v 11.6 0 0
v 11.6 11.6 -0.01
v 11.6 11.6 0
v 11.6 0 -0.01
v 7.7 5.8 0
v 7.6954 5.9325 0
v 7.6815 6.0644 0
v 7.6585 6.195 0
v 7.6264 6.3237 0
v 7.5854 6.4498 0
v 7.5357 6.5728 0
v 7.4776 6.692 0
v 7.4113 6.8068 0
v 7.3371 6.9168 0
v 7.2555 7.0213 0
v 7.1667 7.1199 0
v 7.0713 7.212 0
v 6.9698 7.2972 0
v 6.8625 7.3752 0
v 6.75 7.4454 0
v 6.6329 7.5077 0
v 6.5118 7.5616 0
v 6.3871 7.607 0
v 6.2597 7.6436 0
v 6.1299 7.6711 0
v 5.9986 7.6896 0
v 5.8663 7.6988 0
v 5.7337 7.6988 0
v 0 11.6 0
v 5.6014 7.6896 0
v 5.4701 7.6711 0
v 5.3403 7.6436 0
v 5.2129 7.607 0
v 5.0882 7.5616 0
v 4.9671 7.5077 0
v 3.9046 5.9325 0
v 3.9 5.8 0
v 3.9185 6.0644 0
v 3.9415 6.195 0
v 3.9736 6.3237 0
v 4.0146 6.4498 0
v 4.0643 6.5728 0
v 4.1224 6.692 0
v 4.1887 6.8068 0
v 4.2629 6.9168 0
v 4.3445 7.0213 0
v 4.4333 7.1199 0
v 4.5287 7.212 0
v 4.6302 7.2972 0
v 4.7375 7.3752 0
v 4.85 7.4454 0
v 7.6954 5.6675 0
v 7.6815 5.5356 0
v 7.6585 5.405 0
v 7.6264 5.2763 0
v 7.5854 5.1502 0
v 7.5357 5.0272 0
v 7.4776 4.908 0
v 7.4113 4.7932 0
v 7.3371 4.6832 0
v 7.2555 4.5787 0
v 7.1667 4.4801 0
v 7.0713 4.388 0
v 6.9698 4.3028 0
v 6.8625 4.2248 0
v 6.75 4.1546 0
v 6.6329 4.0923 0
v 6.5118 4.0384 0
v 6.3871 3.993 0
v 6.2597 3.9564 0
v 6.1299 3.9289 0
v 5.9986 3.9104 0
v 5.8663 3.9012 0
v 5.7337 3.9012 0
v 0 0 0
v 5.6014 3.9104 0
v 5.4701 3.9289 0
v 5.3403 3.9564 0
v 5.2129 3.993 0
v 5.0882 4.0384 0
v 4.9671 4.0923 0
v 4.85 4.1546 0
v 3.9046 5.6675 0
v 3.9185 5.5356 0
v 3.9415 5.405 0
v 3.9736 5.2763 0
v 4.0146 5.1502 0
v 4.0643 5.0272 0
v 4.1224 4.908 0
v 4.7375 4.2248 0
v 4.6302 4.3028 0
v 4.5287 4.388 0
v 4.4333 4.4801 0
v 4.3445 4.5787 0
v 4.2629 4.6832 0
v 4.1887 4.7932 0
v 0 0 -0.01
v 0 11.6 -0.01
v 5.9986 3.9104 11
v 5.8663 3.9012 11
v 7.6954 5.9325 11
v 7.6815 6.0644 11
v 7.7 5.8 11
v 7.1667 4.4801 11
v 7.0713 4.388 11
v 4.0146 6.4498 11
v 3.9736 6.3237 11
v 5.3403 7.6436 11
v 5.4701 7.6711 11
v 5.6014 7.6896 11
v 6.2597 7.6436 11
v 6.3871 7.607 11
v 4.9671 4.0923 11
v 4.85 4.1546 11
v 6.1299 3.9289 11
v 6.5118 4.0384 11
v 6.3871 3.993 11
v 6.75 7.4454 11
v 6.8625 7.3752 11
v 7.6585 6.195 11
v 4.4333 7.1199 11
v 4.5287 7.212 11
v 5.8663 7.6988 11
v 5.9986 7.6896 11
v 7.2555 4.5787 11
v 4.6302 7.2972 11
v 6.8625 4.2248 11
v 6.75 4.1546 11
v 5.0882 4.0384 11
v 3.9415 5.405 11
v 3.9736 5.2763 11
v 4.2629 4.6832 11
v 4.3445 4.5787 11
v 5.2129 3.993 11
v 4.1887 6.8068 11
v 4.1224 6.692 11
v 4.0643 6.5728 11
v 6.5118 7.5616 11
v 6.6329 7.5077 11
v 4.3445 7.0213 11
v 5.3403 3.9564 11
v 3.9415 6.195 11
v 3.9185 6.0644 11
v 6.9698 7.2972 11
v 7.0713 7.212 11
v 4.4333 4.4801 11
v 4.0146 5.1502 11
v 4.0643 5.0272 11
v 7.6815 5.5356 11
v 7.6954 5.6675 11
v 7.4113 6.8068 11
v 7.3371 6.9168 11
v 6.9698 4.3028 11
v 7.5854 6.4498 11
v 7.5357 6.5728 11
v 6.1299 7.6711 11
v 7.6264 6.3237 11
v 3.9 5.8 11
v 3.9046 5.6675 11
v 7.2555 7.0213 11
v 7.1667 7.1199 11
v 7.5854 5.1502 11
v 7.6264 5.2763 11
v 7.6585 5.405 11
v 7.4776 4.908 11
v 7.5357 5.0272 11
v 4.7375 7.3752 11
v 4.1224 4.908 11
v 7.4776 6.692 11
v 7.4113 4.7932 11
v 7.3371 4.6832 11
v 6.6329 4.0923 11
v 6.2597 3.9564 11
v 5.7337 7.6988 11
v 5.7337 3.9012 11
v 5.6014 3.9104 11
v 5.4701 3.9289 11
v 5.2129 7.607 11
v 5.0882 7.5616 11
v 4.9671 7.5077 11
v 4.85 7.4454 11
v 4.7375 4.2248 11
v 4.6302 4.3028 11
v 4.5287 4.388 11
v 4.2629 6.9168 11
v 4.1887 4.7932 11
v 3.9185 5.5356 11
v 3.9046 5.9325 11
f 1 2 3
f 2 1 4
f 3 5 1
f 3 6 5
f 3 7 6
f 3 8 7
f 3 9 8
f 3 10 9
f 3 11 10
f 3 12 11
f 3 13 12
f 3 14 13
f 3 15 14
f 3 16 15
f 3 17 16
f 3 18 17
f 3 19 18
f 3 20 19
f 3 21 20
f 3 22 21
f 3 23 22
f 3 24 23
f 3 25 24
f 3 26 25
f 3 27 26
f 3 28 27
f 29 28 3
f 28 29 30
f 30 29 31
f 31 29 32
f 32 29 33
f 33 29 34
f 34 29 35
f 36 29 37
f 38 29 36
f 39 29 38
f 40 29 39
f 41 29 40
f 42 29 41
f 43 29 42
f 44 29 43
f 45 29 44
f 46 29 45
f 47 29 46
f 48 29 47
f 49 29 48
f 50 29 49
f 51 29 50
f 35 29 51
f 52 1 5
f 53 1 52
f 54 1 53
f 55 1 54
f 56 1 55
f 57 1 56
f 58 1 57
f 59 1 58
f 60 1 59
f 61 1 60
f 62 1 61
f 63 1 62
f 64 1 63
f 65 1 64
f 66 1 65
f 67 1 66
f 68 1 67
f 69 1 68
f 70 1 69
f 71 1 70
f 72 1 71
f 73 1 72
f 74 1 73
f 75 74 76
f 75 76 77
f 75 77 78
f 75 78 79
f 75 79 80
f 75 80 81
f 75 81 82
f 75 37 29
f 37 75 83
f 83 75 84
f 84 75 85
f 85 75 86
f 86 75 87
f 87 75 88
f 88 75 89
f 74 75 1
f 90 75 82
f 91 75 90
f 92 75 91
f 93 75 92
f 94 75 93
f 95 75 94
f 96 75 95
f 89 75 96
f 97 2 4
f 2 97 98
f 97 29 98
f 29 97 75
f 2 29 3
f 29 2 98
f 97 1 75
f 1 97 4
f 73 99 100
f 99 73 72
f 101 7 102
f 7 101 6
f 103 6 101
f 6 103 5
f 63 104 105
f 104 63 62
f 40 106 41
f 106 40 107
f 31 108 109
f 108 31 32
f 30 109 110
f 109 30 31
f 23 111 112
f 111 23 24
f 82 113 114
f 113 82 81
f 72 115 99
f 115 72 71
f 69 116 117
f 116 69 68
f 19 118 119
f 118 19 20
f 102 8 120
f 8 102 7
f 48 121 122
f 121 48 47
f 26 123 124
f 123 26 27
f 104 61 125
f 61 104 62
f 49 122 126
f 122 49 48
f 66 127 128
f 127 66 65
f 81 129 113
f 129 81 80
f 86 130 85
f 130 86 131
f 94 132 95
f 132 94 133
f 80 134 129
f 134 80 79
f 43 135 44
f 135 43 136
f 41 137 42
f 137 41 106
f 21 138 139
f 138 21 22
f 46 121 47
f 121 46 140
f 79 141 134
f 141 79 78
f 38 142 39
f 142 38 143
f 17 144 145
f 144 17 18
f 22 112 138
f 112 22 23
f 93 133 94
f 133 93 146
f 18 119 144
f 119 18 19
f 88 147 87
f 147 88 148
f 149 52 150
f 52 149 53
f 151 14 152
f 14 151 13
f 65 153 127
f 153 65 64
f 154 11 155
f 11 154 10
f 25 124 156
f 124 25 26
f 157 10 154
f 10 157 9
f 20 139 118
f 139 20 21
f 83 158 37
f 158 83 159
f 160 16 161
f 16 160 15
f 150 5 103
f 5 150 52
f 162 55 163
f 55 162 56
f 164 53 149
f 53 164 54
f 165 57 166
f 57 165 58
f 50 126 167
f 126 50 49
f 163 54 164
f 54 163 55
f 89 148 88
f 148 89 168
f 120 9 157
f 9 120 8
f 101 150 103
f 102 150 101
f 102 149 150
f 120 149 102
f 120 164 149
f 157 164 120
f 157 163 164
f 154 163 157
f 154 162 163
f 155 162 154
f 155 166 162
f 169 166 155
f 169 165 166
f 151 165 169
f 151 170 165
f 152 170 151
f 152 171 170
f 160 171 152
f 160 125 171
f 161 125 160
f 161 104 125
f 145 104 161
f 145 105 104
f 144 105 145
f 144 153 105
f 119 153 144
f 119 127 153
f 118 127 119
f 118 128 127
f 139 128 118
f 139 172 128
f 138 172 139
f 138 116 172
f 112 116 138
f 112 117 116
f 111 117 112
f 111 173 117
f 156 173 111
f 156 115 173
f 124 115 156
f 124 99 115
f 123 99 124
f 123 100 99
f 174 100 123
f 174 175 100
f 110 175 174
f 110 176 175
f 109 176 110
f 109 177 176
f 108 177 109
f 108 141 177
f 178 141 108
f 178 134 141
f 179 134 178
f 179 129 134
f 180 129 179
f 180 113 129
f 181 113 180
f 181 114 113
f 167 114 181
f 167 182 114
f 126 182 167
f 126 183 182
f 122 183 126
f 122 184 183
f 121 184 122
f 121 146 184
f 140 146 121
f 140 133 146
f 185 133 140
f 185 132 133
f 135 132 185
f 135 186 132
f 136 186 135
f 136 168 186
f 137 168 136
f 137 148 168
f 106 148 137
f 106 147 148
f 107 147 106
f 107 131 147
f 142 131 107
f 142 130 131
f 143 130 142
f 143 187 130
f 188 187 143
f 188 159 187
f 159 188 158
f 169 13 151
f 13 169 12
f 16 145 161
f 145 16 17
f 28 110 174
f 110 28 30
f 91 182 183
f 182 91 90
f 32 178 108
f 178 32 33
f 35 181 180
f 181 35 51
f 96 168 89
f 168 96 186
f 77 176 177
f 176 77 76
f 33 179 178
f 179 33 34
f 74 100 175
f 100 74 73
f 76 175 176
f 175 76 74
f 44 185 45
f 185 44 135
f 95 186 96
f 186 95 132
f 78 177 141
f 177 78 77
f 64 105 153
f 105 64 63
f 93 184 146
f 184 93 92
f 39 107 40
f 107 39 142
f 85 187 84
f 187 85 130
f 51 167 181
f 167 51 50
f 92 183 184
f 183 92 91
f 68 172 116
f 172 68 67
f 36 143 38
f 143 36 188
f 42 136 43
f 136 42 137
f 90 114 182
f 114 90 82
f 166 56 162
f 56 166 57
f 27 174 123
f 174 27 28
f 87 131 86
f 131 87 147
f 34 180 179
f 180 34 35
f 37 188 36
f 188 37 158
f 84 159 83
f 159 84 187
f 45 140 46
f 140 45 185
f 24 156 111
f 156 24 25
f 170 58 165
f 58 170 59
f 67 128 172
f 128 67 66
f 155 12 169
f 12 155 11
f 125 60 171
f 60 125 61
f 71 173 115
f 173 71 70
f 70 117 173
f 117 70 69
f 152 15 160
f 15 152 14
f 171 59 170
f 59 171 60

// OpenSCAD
// file: ../Base/Rotation.scad
// Fischertechnik Box Foundation
// Geometry Helpers Rotation

include <PlacementOptions.scad>

// getRotatedSpace(space, rotation=NoRotation)
// Rotates the space dependent on the specified rotation

function getRotatedSpace(space, rotation=NoRotation) = [
    (rotation == Rotate90 || rotation == Rotate270) ? space.y : space.x,
    (rotation == Rotate90 || rotation == Rotate270) ? space.x : space.y
];

// Rotates the given space around the fixed left lower corner
// space = the space the children needs as width/depth list [width,depth]
// rotation = 0 Rotate0 degrees, 1 Rotate90 degrees, 2 Rotate180 degrees, 3 Rotate270 degrees (equivalent to -90)

module RotateFix(space, rotation=NoRotation) {
    dy = (rotation == Rotate0 || rotation == Rotate270) ? 0 :
        (rotation == Rotate90) ? space.x :
        space.y;
    dx = (rotation < Rotate180) ? 0 :
        (rotation == Rotate180) ? space.x :
        space.y;
    
    translate([dx, dy, 0])
        rotate([0, 0, rotations[rotation]])
            children();
}
// file: ../Base/Alignment.scad
// Fischertechnik Box Foundation
// Geometry Helpers Alignment

include <PlacementOptions.scad>

// getAlignedX(elementWidth, spaceWidth, align=AlignRight, offset=0)
// Gets the aligned X offset of an element with the given
// width in the given space.
// elementWidth = The width of the element to positon
// spaceWidth = The space where the element should be aligned
// align = 0 AlignLeft, 1 AlignCenter, 2 AlignRight
// offset = an optional offset from the aligned position. When
// aligned left or centered, then positive values are in X direction.
// When aligned right then positive values are in negative X direction.

function getAlignedX(elementWidth, spaceWidth, align=AlignRight, offset=0) =
    (align == AlignLeft) ?
        offset :
        ((align == AlignCenter) ?
        (spaceWidth - elementWidth)/2 + offset :
        spaceWidth - offset - elementWidth);

// getAlignedY(elementDepth, spaceDepth, align=AlignTop, offset=0)
// Gets the aligned Y offset of an element with the given
// depth in the given space.
// elementDepth = The depth of the element to positon
// spaceDepth = The space where the element should be aligned
// align = 0 AlignBottom, 1 AlignCenter, 2 AlignTop
// offset = an optional offset from the aligned position. When
// aligned bottom or centered, then positive values are in Y direction.
// When aligned top then positive values are in negative Y direction.

function getAlignedY(elementDepth, spaceDepth, align=AlignTop, offset=0) =
    (align == AlignBottom) ?
        offset :
        ((align == AlignCenter) ?
        (spaceDepth - elementDepth)/2 + offset :
        spaceDepth - offset - elementDepth);
// file: ../Base/PlacementOptions.scad
// Fischertechnik Box Foundation
// Placement Options

// Alignment
NoAlign = 0;
AlignLeft = 1;
AlignBottom = 2;
AlignCenter = 3;
AlignRight = 4;
AlignTop = 5;

// Element rotation degree steps
rotations = [0, -90, -180, -270];

// Rotation
NoRotation = 0;
Rotate0 = 0;
Rotate90 = 1;
Rotate180 = 2;
Rotate270 = 3;

// Docking (seen from above)
NoDock = -1;
DockLeft = 0;
DockTop = 1;
DockRight = 2;
DockCorner = 2;
DockBottom = 3;

// Web corners
LowerLeft = 0;
UpperLeft = 1;
UpperRight = 2;
LowerRight = 3;

// Web position relative to corner
LeftOfCorner = 0;
RightOfCorner = 1;

// Rails direction
Horizontal = true;
Vertical = false;
// file: ../Base/Boxes.scad
// Fischertechnik Box Foundation
// Pre-designed Boxes

use <Constants.scad>

include <PlacementOptions.scad>

box190Width = 190;
box190Depth = 130;
box130Width = 130;
box130Depth = 95;

// Values are from an original ec3 box
topBottomDifference = 1.5;
outerHeight = 40;
baseThickness = 1.8;
innerHeight = outerHeight - baseThickness;
stackExcess = 5.7;
radius = 3.5;
wallThickness = 1.5;
tolerance = 0.2;

boxWallThickness = wallThickness;
boxBaseThickness = baseThickness;
boxWebWidth = 3.0;

// getBoxWallThickness()
// Gets the wall thickness of a Fischertechnik Box
function getBoxWallThickness() = boxWallThickness;

// getBoxUsageHeight(height = 38.2)
// Gets the usable height of a Fischertechnik box
// height = Outer height of the box from the bottom to the upper edge.
function getBoxUsageHeight(height = outerHeight) = height - baseThickness - stackExcess;

// getBoxInnerHeight()
// Gets the inner height of a Fischertechnik box, including the stack excess
function getBoxInnerHeight() = innerHeight;

// getBoxBaseThickness()
// Gets the thickness of the Fischertechnik box base.
function getBoxBaseThickness() = boxBaseThickness;

// getBoxWebWidth()
// Gets the width of a box web
function getBoxWebWidth() = boxWebWidth;

// getBox190Space()
// Gets the usable inner space of a Box 190 as an x/y-list
function getBox190Space() = [
    box190Width - 2*getBoxWallThickness() - topBottomDifference, 
    box190Depth - 2*getBoxWallThickness() - topBottomDifference ];

// RoundedCornerPlate(width, depth, height, radius)
// Creates a body plate with rounded corners for a box. Used
// also to create the complete box with the hull module.
// width = Width of the plate
// depth = depth of the plate 
// height = thickness of the plate
// radius = radius of the rounded corner
module RoundedCornerPlate(width, depth, height, radius) {
    translate([radius, radius])
    hull() {
        w = width-2*radius;
        d = depth-2*radius;
        cube([w, d, height]);
        cylinder(height, r=radius, $fn=getFragments());
        translate([w, 0])
            cylinder(height, r=radius, $fn=getFragments());
        translate([w, d])
            cylinder(height, r=radius, $fn=getFragments());
        translate([0, d])
            cylinder(height, r=radius, $fn=getFragments());
    }
}

// BoxBase(width, depth)
// Creates an empty stackable Fischertechnik compatible box
// width = Outer width of the box (190, 130, ...)
// depth = Outer depth of the box (130, 95, ...)

module BoxBase(width, depth, height=outerHeight) {    
    thinPlate = 0.01;

    innerHeight = height - baseThickness;    
    
    module Body(tolerance=tolerance) {
        hull() {
            // Bottom with tolerance to fit into the original boxes when stacked
            translate([-wallThickness+tolerance, -wallThickness+tolerance, -baseThickness])
                RoundedCornerPlate(width-topBottomDifference-2*tolerance, depth-topBottomDifference-2*tolerance, thinPlate, radius);
            
            // Top
            translate([-wallThickness-topBottomDifference/2, -wallThickness-topBottomDifference/2, innerHeight-thinPlate])
                RoundedCornerPlate(width, depth, thinPlate, radius);
         }
    }

    module Cutoff() {
        hull() {
            coWidth = width - 2*wallThickness;
            coDepth = depth - 2*wallThickness;
            
            // Bottom
            RoundedCornerPlate(coWidth-topBottomDifference, coDepth-topBottomDifference, thinPlate, radius);

            // Top
            translate([-topBottomDifference/2, -topBottomDifference/2, innerHeight+thinPlate]) 
                RoundedCornerPlate(coWidth, coDepth, thinPlate, radius);
        }
    }
    
    difference() {        
        Body();
        Cutoff();
        stackOffset = innerHeight - stackExcess;
        translate([0, 0, stackOffset + baseThickness])
            Body(tolerance=0);
    }
}

// Creates the Fischertechnik empty box 130x190 mm and places it at position 0,0
// 190x130 are the outer sizes, the inner space is slightly smaller. Use getBox190Space() to get the inner sizes.
// The box is positioned that the usable inner space is at the 0,0,0 position.

module Box190() {
    BoxBase(box190Width, box190Depth);
}

// Gets the usable inner space of a Box 130 as an x/y-list
function getBox130Space() = [
    box130Width - 2*getBoxWallThickness() - topBottomDifference, 
    box130Depth - 2*getBoxWallThickness() - topBottomDifference ];

// Creates the Fischertechnik empty box 95x130 mm and places it at position 0,0
// 190x130 are the outer sizes, the inner space is slightly smaller. Use getBox190Space() to get the inner sizes.
// The box is positioned that the usable inner space is at the 0,0,0 position.

module Box130() {
    BoxBase(box130Width, box130Depth);
}

// Creates a web at the specified box walls
// corner 0 = LowerLeft, 1 = UpperLeft, 2 = UpperRight, 3 = LowerRight
// side 0 = LeftOfCorner, 1 = RightOfCorner
// distance = Distance in mm from the corner
// boxSpace = inner width and depth of the box (default: Box 190)
// webWidth = length of the web (default is 3 mms)
// webThickness = thickness of the web (default is 1 mm)
// height = Height of the web (standard is getBoxUsageHeight())
// sink = How much of the web is sunk into the wall

module BoxWeb(
    corner, 
    side, 
    distance, 
    boxSpace=getBox190Space(), 
    webWidth=getBoxWebWidth(), 
    webThickness=1.0, 
    height=getBoxUsageHeight(),
    sink = getBoxWallThickness()/2) {
    width = (corner % 2 == 0) ? 
            (side == LeftOfCorner ? webWidth : webThickness) :
            (side == LeftOfCorner ? webThickness : webWidth);

    depth = (corner % 2 == 0) ? 
            (side == RightOfCorner ? webWidth : webThickness) :
            (side == RightOfCorner ? webThickness : webWidth);
    
    xDiff = corner == LowerLeft ? 
                (side == LeftOfCorner ? -sink : distance) :
            (corner == UpperLeft ?                
                (side == LeftOfCorner ? distance : -sink) :
            (corner == UpperRight ?
                (side == LeftOfCorner ? boxSpace.x-webWidth+sink : boxSpace.x-distance-webThickness) :
                (side == LeftOfCorner ? boxSpace.x-distance-webThickness: boxSpace.x-webWidth+sink)));

    yDiff = corner == LowerLeft ? 
                (side == RightOfCorner ? -sink : distance) :
            (corner == UpperLeft ?
                (side == RightOfCorner ? boxSpace.y-distance-webThickness : boxSpace.y-webWidth+sink) :
            (corner == UpperRight ?
                (side == RightOfCorner ? boxSpace.y-webWidth+sink : boxSpace.y-distance-webThickness) :
                (side == RightOfCorner ? distance : -sink)));
    
    translate([xDiff, yDiff, -getExcess()])
        cube([width, depth, height + 2*getExcess()]);
}
// file: ../Base/Placement.scad
// Fischertechnik Box Foundation
// Geometry Helpers Placement

use <Constants.scad>
use <Alignment.scad>
use <Rotation.scad>
use <Boxes.scad>

include <PlacementOptions.scad>

// Place(x=0, y=0, elementSpace=[0,0], alignX=AlignLeft, alignY=AlignBottom, rotation=Rotate0, boxSpace=getBox190Space())
// Places the child at the specified position
// y = Y-Position. This is a relative position when an X aligment is specified.
// x = X-Position. This is a relative position when an Y aligment is specified.
// elementSpace = space of the element to be placed [x,y]
// alignX = -1=NoAlign, 0 AlignLeft, 1 AlignCenter, 3 AlignRight (elementSpace and boxSpace required!)
// alignY = -1=NoAlign, 2 AlignBottom, 1 AlignCenter, 4 AlignTop (elementSpace and boxSpace required!)
// rotation = 0 Rotate0 0 degrees, 1 Rotate90 90 degrees, 
// 2 Rotate180 180 degrees, 3 Rotate270 270 degrees (equivalent to -90)
// boxSpace = Inner space of the box where the placement occurs [x,y] - default is Box 190x130 inner space

module Place(x=0, y=0, elementSpace=[0,0], 
  alignX=AlignLeft, alignY=AlignBottom, 
  rotation=NoRotation, boxSpace=getBox190Space()) {

    module Position(x, y, space, rotation=Rotate0) {
        translate([x, y, 0])
            RotateFix(space, rotation)
                children();
    }

    space = getRotatedSpace(elementSpace, rotation);
    alignedX = getAlignedX(space.x, boxSpace.x, alignX, x);
    alignedY = getAlignedY(space.y, boxSpace.y, alignY, y);
    Position(alignedX, alignedY, elementSpace, rotation)
        children();
}

// Center(space=getBox130Space(), elementSpace=[0,0])
// space = Space where the children is centered. For cylinder use centered=true and no elementSpace.
// elementSpace = space of the element to be centered [x,y]

module Center(space=getBox190Space(), elementSpace=[0,0]) {
    Place(elementSpace=elementSpace, boxSpace=space, alignX=AlignCenter, alignY=AlignCenter)
        children();
}

// CenterHorizontal(width=0, y=0, offset=0, space=getBox130Space())
// width = Width of the element to be placed.
// y = Y position of the element
// offset = Offset from the center position (negative will be left of the center)
// space = Space where the element is placed

module CenterHorizontal(width=0, y=0, offset=0, space=getBox190Space()) {
    Place(x=offset, y=y, elementSpace=[width, 0], boxSpace=space, alignX=AlignCenter)
        children(0);
}

// CenterVertical(depth=0, x=0, offset=0, space=getBox130Space())
// depth = Depth of the element to be placed.
// x = X position of the element
// offset = Offset from the center position (negative will be down of the center)
// space = Space where the element is placed

module CenterVertical(depth=0, x=0, offset=0, space=getBox190Space()) {
    Place(x=x, y=offset, elementSpace=[0, depth], boxSpace=space, alignY=AlignCenter)
        children(0);
}

// getIsVertical(align)
// True if the specified alignment needs a vertical orientation for a divider (AlignRight, AlignLeft)

function getIsVertical(align) = (align == AlignRight || align == AlignLeft);

// getIsHorizontal(align)
// True if the specified alignment needs a horizontal orientation for a divider (AlignTop, AlignBottom)

function getIsHorizontal(align) = (align == AlignTop || align == AlignBottom);
// file: ../Base/Constants.scad
// Fischertechnik Box Foundation
// Constants

// Constant values necessary for multiple elements

// Base constants
dividerThickness = 1.2;
excess = 0.01;
fragments = 90;
tolerance = 0.8;

// Gets the thickness of a divider 
function getDividerThickness() = dividerThickness;

// Gets the excess that is used to merge walls into each other
function getExcess() = excess;

// Gets amount of fragments of a cylinder
function getFragments() = fragments;

// Gets the inner tolerance of a frame to each side
function getTolerance() = tolerance;


// Fischertechnik specific constants
axisDiameter = 4;
axisBottomDiameter = axisDiameter + 1;
axisTolerance = 0.2;
axisLockingLength = 8;

// Gets axis diameter of Fischertechnik axis
function getAxisDiameter() = axisDiameter;

// Gets axis diameter tolerance (subtracted for element axis)
function getAxisTolerance() = axisTolerance;

// Gets the axis diameter for standing axis
function getStandAxisDiameter() = getAxisDiameter() - getAxisTolerance();

// Gets axis bottom diameter for thicker part at the bottom
function getAxisBottomDiameter() = axisBottomDiameter;

// Gets the lengthh of the locking part of a locking axis
function getAxisLockingLength() = axisLockingLength;

// Studs

studHeight = 2.5;
studTolerance = 0.2;

// gets the height of a connecting stud
function getStudHeight() = studHeight;

// gets the connecting stud height tolerance
function getStudTolerance() = studTolerance;

// Dockable Frame with Edge

standardEdgeDistance = 2.5;
standardWebDistance = 11.5;
standardCornerLength = 15;

// gets the standard distance to the wall of the box for dockable frames with webs
function getStandardEdgeDistance() = standardEdgeDistance;

// gets the standard distance of each web to the corner of the dockable frame
function getStandardWebDistance() = standardWebDistance;

// gets the standard length of the corner walls of a dockable frame
function getStandardCornerLength() = standardCornerLength;

// Tubes

tubeWallFactor = 0.8;

// gets the wall thickness of a tube.
function getTubeWallThickness() = tubeWallFactor * getDividerThickness();

// Small Parts and Divider Frame

smallPartsFrameHeight = 20;

// gets the frame height for docked small parts boxes.
function getSmallPartsFrameHeight() = smallPartsFrameHeight;

// Hubs

hubRingDiameter = 19.5;
hubRingLevelDiameter = 21;

// gets the diameter of a tube matching the inner ring of a wheel
function getHubRingDiameter() = hubRingDiameter;

// gets the diameter of a hub tube with a thicker diameter
function getHubRingLevelDiameter() = hubRingLevelDiameter;

// Struts

strutAddLength = 9.0;
strutDepth = 8.0;

// gets the full length of a strut
function getFullStrutLength(length) = length + strutAddLength;

// gets the radius of the end of a strut
function getStrutEndRadius() = strutAddLength / 2;

// gets the the depth of a strut
function getStrutDepth() = strutDepth;

// Propeller

propellerAxisDiameter = 7.0;
propellerAxisTolerance = 0.2;

// gets the propeller axis outer diameter
function getPropellerAxisDiameter() = propellerAxisDiameter;

// gets the propeller axis printing tolerance
function getPropellerAxisTolerance() = propellerAxisTolerance;
// main file
// Fischertechnik Box Library
// Axis for propeller tip
// 37681

use <../Base/Constants.scad>
use <../ModelBase/Simple.scad>

/* [Hidden] */
space = 11.6;

// getAxisPropellerTipSpace()
// Gets the space the axis for a propeller tip needs as width and depth (.x and .y as a list)

function getAxisPropellerTipSpace() = [space, space];

// AxisPropellerTip()
// Standing axis for a propeller tip 37681

module AxisPropellerTip() {
    height = 11;
    AxisWithSpace(height, getAxisPropellerTipSpace());
}

// Tests
color("lightgray")
AxisPropellerTip();
